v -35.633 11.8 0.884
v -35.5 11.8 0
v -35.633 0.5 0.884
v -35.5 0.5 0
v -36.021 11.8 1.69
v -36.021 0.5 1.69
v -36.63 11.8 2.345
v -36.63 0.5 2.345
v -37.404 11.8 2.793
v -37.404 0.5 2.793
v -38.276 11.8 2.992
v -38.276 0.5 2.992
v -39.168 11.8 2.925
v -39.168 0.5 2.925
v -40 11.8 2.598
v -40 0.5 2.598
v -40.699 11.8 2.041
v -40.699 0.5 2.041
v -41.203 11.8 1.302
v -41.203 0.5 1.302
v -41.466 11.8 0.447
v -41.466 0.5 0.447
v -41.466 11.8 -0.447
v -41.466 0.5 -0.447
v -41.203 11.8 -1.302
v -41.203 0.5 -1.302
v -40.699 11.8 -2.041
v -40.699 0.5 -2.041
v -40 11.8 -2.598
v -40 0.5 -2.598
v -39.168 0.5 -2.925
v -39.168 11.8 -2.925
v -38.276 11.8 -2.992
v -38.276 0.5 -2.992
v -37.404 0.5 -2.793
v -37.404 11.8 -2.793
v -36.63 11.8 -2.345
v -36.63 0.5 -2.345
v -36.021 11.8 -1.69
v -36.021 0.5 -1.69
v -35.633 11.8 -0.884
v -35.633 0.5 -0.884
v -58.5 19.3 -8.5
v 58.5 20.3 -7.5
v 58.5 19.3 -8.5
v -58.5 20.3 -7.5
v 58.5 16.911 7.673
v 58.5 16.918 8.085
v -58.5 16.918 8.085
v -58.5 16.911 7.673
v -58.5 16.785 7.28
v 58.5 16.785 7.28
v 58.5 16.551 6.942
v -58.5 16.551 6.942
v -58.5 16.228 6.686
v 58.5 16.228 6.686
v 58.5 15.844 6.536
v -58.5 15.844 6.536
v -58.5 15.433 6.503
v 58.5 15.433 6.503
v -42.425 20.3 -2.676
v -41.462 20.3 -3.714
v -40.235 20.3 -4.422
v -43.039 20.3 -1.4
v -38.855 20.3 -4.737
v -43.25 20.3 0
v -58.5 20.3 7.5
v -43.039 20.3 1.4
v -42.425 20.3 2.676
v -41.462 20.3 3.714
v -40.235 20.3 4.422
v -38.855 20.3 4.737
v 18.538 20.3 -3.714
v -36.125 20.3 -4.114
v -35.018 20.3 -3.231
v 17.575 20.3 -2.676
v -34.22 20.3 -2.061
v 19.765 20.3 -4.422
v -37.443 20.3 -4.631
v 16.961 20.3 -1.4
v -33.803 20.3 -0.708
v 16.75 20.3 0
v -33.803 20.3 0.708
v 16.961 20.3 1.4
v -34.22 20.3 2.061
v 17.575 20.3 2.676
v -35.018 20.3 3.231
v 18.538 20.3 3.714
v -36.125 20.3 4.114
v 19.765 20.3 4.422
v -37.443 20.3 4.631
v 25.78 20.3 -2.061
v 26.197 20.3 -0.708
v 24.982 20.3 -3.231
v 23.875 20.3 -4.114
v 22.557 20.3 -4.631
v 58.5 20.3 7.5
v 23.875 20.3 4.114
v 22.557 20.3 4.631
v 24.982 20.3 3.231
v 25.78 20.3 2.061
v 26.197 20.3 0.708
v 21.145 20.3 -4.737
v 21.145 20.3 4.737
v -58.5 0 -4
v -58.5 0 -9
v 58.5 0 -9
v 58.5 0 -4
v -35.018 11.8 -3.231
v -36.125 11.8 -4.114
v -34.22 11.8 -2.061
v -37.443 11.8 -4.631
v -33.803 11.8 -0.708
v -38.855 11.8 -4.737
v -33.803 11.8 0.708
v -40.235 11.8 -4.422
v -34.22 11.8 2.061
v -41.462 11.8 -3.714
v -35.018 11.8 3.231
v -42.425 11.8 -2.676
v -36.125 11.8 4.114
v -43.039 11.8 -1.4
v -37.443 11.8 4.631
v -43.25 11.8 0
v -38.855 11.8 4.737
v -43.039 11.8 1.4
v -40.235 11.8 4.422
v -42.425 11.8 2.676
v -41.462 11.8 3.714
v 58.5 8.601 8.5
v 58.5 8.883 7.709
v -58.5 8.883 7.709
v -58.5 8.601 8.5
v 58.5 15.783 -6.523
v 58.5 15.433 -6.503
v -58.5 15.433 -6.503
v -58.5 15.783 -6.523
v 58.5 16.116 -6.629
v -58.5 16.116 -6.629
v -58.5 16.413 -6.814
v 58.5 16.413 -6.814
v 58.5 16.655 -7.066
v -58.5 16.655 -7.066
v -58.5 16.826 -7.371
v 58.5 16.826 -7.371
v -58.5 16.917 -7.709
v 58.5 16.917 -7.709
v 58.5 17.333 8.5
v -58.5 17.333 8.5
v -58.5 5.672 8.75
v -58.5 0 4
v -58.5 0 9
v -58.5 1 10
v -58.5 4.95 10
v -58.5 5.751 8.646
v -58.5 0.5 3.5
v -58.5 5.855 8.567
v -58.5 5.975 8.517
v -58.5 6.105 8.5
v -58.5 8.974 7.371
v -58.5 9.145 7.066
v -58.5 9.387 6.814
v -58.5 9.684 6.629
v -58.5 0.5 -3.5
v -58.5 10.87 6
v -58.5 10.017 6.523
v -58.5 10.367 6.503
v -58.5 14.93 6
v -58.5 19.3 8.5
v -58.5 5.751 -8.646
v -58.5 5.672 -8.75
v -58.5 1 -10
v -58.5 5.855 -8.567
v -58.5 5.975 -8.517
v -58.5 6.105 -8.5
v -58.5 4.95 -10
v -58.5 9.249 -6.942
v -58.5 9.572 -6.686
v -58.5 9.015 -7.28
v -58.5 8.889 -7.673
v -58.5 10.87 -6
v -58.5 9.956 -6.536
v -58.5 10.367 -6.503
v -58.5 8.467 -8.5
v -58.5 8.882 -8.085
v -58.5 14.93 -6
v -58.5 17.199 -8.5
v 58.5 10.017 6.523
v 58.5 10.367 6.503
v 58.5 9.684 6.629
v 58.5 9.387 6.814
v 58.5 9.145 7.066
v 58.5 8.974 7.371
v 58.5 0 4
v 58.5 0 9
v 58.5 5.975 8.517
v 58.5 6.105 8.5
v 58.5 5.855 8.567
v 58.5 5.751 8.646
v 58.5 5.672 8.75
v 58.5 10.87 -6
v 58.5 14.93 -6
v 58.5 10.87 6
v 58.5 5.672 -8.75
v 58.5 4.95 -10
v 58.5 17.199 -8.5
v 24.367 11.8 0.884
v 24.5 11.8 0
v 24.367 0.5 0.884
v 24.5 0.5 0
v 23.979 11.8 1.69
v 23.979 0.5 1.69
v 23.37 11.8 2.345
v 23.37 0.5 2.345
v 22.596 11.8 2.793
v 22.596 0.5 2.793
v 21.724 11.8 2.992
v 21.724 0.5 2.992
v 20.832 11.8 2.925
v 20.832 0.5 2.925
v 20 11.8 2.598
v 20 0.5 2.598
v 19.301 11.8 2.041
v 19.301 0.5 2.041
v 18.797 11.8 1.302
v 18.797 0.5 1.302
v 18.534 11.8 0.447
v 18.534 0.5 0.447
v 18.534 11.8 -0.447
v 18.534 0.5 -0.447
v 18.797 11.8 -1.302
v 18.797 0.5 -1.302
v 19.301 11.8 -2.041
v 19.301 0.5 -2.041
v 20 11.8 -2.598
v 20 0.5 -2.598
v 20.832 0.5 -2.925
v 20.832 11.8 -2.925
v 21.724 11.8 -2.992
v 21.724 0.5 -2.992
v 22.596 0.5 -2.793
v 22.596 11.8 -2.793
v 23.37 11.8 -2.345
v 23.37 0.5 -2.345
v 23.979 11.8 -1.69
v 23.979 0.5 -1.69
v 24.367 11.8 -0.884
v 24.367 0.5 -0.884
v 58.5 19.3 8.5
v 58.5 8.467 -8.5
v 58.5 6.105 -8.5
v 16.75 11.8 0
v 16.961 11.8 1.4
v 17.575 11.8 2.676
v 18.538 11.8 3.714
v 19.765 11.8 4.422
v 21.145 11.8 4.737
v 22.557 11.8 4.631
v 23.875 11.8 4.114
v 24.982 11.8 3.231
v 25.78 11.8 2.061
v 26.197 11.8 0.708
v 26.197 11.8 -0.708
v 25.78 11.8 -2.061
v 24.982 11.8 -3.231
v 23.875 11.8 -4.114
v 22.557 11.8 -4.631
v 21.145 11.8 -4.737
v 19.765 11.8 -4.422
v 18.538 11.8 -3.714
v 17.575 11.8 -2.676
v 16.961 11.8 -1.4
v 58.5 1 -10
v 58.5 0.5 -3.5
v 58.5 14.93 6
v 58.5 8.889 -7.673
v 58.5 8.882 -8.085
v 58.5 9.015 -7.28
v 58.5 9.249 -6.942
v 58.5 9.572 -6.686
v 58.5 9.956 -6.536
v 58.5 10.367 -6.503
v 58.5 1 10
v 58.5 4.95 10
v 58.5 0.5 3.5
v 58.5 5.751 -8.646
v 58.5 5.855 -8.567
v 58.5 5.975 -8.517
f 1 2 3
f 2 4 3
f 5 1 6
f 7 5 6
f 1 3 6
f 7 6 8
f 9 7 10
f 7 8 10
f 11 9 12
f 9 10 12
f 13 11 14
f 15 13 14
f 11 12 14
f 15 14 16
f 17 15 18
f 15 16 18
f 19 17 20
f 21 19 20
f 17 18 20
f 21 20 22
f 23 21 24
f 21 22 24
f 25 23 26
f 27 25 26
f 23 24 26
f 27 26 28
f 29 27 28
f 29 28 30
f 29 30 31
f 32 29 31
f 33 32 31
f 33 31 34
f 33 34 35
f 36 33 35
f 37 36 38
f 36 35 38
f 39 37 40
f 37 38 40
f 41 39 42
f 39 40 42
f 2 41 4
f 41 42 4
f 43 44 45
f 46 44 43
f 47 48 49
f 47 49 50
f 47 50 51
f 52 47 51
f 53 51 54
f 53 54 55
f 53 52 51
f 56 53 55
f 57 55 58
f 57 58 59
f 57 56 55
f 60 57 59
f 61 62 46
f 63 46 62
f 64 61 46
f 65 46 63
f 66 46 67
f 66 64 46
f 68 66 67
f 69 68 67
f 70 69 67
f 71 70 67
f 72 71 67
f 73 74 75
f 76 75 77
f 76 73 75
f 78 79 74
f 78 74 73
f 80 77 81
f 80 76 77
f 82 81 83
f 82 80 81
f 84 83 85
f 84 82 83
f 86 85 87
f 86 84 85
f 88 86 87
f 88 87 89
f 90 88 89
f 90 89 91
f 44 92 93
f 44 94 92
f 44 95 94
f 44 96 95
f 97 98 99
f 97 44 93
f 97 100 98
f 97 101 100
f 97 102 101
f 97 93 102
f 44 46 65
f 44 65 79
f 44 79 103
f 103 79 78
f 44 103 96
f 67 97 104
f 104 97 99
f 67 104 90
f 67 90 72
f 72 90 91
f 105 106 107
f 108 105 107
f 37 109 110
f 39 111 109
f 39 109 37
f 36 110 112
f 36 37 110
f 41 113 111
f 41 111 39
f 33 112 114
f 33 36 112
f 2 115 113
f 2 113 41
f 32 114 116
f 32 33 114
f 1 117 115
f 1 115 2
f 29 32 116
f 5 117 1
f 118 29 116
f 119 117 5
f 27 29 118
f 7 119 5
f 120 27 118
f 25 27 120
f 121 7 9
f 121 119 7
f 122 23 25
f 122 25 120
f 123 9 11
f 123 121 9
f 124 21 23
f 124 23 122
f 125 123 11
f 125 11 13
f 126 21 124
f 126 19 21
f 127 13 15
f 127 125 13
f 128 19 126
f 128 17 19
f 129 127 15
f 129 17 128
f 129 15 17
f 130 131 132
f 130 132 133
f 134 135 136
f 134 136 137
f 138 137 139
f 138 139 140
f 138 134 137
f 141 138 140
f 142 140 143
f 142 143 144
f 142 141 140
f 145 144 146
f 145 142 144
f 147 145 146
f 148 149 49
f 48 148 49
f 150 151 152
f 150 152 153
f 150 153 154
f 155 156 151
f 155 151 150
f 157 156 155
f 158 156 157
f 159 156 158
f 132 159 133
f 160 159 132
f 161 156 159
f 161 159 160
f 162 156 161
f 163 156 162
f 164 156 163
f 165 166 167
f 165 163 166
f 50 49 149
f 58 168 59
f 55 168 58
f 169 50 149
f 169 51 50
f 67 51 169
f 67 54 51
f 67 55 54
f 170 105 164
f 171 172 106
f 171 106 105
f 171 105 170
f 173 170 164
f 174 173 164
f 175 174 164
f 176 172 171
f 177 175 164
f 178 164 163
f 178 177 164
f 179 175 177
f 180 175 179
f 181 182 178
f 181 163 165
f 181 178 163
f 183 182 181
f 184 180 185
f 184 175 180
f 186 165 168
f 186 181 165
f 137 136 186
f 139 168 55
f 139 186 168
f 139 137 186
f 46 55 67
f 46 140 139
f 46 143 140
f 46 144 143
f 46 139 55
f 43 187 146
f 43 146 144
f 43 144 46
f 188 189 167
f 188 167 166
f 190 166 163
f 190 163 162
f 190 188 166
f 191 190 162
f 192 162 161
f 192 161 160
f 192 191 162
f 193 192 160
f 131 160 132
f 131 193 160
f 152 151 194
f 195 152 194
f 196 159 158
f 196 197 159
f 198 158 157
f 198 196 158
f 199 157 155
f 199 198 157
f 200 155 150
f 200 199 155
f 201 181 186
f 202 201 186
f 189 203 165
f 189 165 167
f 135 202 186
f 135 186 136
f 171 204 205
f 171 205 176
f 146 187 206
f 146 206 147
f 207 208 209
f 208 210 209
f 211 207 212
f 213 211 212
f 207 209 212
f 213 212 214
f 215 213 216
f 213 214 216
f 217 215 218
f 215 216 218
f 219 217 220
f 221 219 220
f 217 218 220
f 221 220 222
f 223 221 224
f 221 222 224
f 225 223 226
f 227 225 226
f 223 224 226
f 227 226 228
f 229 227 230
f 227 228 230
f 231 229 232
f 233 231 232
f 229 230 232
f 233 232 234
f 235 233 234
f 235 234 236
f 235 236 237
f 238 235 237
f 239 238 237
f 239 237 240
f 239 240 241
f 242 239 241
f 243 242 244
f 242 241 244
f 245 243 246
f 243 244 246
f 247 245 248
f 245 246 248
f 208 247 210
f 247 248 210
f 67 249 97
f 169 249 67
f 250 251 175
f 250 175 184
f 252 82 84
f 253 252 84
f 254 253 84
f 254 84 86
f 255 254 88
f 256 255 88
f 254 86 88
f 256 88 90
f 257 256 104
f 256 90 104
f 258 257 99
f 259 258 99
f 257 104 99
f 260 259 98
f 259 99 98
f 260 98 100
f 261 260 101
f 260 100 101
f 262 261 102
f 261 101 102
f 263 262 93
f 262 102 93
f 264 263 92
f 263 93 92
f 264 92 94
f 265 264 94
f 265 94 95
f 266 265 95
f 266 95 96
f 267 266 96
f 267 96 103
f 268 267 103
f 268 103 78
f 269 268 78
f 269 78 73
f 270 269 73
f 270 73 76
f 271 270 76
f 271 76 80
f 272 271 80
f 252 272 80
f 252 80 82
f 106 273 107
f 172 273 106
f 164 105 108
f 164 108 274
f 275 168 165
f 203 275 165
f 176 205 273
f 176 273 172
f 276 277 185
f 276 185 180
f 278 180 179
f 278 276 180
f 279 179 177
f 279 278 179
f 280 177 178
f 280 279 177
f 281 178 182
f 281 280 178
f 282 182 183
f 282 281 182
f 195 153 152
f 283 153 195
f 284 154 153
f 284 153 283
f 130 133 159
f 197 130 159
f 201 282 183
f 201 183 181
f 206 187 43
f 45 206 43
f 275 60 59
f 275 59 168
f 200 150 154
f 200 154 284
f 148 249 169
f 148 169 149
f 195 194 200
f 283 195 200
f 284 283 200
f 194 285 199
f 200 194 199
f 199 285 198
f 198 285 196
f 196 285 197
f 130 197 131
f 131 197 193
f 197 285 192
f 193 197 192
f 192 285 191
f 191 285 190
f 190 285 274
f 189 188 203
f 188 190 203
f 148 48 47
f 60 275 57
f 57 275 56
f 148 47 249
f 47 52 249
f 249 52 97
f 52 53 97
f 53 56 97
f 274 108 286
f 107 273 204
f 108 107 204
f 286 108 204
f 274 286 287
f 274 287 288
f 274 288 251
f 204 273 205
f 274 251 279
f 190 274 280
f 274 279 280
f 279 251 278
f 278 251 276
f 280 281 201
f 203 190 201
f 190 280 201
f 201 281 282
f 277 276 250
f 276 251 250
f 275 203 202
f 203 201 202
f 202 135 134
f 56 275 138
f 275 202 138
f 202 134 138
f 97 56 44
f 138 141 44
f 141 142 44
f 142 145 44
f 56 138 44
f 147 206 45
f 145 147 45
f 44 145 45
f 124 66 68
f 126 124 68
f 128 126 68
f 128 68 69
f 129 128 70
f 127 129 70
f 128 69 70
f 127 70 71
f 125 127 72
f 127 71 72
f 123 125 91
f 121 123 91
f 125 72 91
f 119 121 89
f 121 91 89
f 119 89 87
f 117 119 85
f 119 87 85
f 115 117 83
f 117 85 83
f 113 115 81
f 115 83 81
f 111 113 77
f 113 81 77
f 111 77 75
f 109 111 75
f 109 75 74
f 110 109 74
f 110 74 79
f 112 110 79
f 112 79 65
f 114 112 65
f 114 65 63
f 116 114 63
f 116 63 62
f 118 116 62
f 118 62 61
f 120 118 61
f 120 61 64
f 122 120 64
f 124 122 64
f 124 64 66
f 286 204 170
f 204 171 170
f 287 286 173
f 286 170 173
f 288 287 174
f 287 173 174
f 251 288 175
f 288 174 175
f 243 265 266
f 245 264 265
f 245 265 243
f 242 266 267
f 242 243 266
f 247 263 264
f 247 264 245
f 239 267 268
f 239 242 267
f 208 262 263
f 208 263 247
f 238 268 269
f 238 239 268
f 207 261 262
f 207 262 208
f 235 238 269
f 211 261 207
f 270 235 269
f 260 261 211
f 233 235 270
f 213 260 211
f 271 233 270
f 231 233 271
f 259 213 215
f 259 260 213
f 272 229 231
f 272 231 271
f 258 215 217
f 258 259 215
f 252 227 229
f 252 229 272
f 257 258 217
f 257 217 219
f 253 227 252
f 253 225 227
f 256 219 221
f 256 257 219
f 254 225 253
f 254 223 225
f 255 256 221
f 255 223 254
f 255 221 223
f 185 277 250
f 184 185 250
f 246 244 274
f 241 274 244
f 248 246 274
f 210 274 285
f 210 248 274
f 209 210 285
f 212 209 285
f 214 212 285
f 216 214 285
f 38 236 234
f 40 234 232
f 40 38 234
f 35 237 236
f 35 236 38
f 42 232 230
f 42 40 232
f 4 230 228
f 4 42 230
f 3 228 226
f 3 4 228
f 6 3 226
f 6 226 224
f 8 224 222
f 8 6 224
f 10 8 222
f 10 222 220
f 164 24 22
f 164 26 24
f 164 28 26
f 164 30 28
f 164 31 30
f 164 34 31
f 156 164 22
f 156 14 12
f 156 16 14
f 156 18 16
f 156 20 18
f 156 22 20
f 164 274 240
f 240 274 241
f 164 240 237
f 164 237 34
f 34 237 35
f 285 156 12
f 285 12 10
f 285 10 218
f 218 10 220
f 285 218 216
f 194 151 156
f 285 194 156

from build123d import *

# Parameters (mm, degrees)
BOSS_EXTRUDE1_DEPTH = 117
SKETCH2_W           = 117
SKETCH2_H           = 5.816025404
BOSS_EXTRUDE2_DEPTH = 1.5
SKETCH3_W           = 117
SKETCH3_H           = 4.95
BOSS_EXTRUDE3_DEPTH = 1.5
SKETCH4_W           = 7
SKETCH4_H           = 0.5
CUT_EXTRUDE1_DEPTH  = 120.168326329
DRAFT1_ANGLE        = 30
DRAFT2_ANGLE        = 30
DRAFT3_ANGLE        = 45
HOLE1_D             = 6
HOLE1_DEPTH         = 20.3
HOLE1_CBORE_D       = 9.5
HOLE1_CBORE_DEPTH   = 8.5
CHAMFER1_SIZE       = 1
CHAMFER2_SIZE       = 0.404011753
CHAMFER2_SIZE_2     = 0.538175706
FILLET1_R           = 0.5


with BuildPart() as part:
    # Sketch1 → Boss-Extrude1 (new body)
    with BuildSketch(Plane(origin=(58.5, 0, 0), x_dir=(0, 0, -1), z_dir=(1, 0, 0))):
        with BuildLine():
            Line((-8.5, 0), (8.5, 0))
            Line((8.5, 0), (8.5, 9.005088936))
            ThreePointArc((8.5, 9.005088936), (7.111244718, 9.113338811), (6.503340774, 10.366659226))
            Line((6.503340774, 10.366659226), (6, 10.87))
            Line((6, 10.87), (6, 14.93))
            Line((6, 14.93), (6.503340774, 15.433340774))
            ThreePointArc((6.503340774, 15.433340774), (7.111244718, 16.686661189), (8.5, 16.794911064))
            Line((8.5, 16.794911064), (8.5, 20.3))
            Line((8.5, 20.3), (-8.5, 20.3))
            Line((-8.5, 20.3), (-8.5, 16.794911064))
            ThreePointArc((-8.5, 16.794911064), (-7.111244718, 16.686661189), (-6.503340774, 15.433340774))
            Line((-6.503340774, 15.433340774), (-6, 14.93))
            Line((-6, 14.93), (-6, 10.87))
            Line((-6, 10.87), (-6.503340774, 10.366659226))
            ThreePointArc((-6.503340774, 10.366659226), (-7.111244718, 9.113338811), (-8.5, 9.005088936))
            Line((-8.5, 9.005088936), (-8.5, 0))
        make_face()
    extrude(amount=-BOSS_EXTRUDE1_DEPTH)

    # Sketch2 → Boss-Extrude2 (add)
    with BuildSketch(Plane(origin=(0, 0, -8.5), x_dir=(-1, 0, 0), z_dir=(0, 0, -1))):
        with Locations((0, 2.908012702)):
            Rectangle(SKETCH2_W, SKETCH2_H)
    extrude(amount=BOSS_EXTRUDE2_DEPTH)

    # Sketch3 → Boss-Extrude3 (add)
    with BuildSketch(Plane.XY.offset(8.5)):
        with Locations((0, 2.475)):
            Rectangle(SKETCH3_W, SKETCH3_H)
    extrude(amount=BOSS_EXTRUDE3_DEPTH)

    # Sketch4 → Cut-Extrude1 (cut, through all)
    with BuildSketch(Plane.ZY.offset(58.5)):
        with Locations((0, 0.25)):
            Rectangle(SKETCH4_W, SKETCH4_H)
    extrude(amount=-CUT_EXTRUDE1_DEPTH, mode=Mode.SUBTRACT)

    # Draft1
    draft1_faces = [part.faces().sort_by_distance(p)[0] for p in [
        (0, 4.95, 9.25),
    ]]
    draft(draft1_faces, Plane.XY.offset(10), DRAFT1_ANGLE)

    # Draft2
    draft2_faces = [part.faces().sort_by_distance(p)[0] for p in [
        (0, 5.816025404, -9.25),
    ]]
    draft(draft2_faces, Plane(origin=(-58.5, 0, -8.5), x_dir=(0, -1, 0), z_dir=(0, 0, -1)), DRAFT2_ANGLE)

    # Draft3
    draft3_faces = [part.faces().sort_by_distance(p)[0] for p in [
        (0, 0.25, 3.5),
        (0, 0.25, -3.5),
    ]]
    draft(draft3_faces, Plane(origin=(58.5, 0.5, 3.5), x_dir=(0, 0, -1), z_dir=(0, -1, 0)), DRAFT3_ANGLE)

    # Hole1
    with Locations(Plane(origin=(0, 20.3, 0), x_dir=(-1, 0, 0), z_dir=(0, 1, 0))):
        with Locations((38.5, 0), (-21.5, 0)):
            CounterBoreHole(HOLE1_D / 2, HOLE1_CBORE_D / 2, HOLE1_CBORE_DEPTH, depth=HOLE1_DEPTH)

    # Chamfer1
    chamfer1_edges = [part.edges().sort_by_distance(p)[0] for p in [
        (0, 20.3, 8.5),
        (0, 20.3, -8.5),
        (0, 0, -10),
        (0, 0, 10),
    ]]
    chamfer(chamfer1_edges, length=CHAMFER1_SIZE)

    # Chamfer2
    # the kernel refuses this chamfer: 0.538175706, 0.404011753 mm, written as the material it takes off along each edge
    with BuildSketch(Plane(origin=(60.548293872, 9.005088936, 8.5), x_dir=(0, -0.15244489299056474, -0.9883119723048464), z_dir=(-1, 0, 0))) as chamfer2_piece_1:
        with BuildLine():
            Line((0.800315903, 0), (CHAMFER2_SIZE * 0.152444893097, CHAMFER2_SIZE * 0.988311972993))
            Line((CHAMFER2_SIZE * 0.152444893097, CHAMFER2_SIZE * 0.988311972993), (0, 0))
            ThreePointArc((0, 0), (0.41007662, 0.05837118), (0.800315903, 0))
        make_face()
    extrude(amount=121.096587744, mode=Mode.SUBTRACT)
    with BuildSketch(Plane(origin=(59.884017308, 16.794911064, 8.5), x_dir=(0, 1, 0), z_dir=(-1, 0, 0))) as chamfer2_piece_2:
        with BuildLine():
            Line((CHAMFER2_SIZE_2, 0), (0.122854653, 0.415321053))
            ThreePointArc((0.122854653, 0.415321053), (0.079061625, 0.207906373), (0, 0))
            Line((0, 0), (CHAMFER2_SIZE_2, 0))
        make_face()
    extrude(amount=119.768034616, mode=Mode.SUBTRACT)
    with BuildSketch(Plane(origin=(60.548293872, 16.794911064, -8.5), x_dir=(0, 1, 0), z_dir=(-1, 0, 0))) as chamfer2_piece_3:
        with BuildLine():
            Line((CHAMFER2_SIZE, 0), (0.122004072, -0.790961789))
            ThreePointArc((0.122004072, -0.790961789), (0.120203022, -0.396385245), (0, 0))
            Line((0, 0), (CHAMFER2_SIZE, 0))
        make_face()
    extrude(amount=121.096587744, mode=Mode.SUBTRACT)
    with BuildSketch(Plane(origin=(59.884017308, 9.005088936, -8.5), x_dir=(0, -0.28365649946208477, 0.958925956637381), z_dir=(-1, 0, 0))) as chamfer2_piece_4:
        with BuildLine():
            Line((0.433110659, 0), (CHAMFER2_SIZE_2 * 0.283656499578, -CHAMFER2_SIZE_2 * 0.958925957029))
            Line((CHAMFER2_SIZE_2 * 0.283656499578, -CHAMFER2_SIZE_2 * 0.958925957029), (0, 0))
            ThreePointArc((0, 0), (0.221793162, -0.01684025), (0.433110659, 0))
        make_face()
    extrude(amount=119.768034616, mode=Mode.SUBTRACT)

    # Fillet1
    fillet1_edges = [part.edges().sort_by_distance(p)[0] for p in [
        (0, 5.816025404, -8.5),
        (0, 5.816025404, 8.5),
    ]]
    fillet(fillet1_edges, radius=FILLET1_R)


solid = part.part
